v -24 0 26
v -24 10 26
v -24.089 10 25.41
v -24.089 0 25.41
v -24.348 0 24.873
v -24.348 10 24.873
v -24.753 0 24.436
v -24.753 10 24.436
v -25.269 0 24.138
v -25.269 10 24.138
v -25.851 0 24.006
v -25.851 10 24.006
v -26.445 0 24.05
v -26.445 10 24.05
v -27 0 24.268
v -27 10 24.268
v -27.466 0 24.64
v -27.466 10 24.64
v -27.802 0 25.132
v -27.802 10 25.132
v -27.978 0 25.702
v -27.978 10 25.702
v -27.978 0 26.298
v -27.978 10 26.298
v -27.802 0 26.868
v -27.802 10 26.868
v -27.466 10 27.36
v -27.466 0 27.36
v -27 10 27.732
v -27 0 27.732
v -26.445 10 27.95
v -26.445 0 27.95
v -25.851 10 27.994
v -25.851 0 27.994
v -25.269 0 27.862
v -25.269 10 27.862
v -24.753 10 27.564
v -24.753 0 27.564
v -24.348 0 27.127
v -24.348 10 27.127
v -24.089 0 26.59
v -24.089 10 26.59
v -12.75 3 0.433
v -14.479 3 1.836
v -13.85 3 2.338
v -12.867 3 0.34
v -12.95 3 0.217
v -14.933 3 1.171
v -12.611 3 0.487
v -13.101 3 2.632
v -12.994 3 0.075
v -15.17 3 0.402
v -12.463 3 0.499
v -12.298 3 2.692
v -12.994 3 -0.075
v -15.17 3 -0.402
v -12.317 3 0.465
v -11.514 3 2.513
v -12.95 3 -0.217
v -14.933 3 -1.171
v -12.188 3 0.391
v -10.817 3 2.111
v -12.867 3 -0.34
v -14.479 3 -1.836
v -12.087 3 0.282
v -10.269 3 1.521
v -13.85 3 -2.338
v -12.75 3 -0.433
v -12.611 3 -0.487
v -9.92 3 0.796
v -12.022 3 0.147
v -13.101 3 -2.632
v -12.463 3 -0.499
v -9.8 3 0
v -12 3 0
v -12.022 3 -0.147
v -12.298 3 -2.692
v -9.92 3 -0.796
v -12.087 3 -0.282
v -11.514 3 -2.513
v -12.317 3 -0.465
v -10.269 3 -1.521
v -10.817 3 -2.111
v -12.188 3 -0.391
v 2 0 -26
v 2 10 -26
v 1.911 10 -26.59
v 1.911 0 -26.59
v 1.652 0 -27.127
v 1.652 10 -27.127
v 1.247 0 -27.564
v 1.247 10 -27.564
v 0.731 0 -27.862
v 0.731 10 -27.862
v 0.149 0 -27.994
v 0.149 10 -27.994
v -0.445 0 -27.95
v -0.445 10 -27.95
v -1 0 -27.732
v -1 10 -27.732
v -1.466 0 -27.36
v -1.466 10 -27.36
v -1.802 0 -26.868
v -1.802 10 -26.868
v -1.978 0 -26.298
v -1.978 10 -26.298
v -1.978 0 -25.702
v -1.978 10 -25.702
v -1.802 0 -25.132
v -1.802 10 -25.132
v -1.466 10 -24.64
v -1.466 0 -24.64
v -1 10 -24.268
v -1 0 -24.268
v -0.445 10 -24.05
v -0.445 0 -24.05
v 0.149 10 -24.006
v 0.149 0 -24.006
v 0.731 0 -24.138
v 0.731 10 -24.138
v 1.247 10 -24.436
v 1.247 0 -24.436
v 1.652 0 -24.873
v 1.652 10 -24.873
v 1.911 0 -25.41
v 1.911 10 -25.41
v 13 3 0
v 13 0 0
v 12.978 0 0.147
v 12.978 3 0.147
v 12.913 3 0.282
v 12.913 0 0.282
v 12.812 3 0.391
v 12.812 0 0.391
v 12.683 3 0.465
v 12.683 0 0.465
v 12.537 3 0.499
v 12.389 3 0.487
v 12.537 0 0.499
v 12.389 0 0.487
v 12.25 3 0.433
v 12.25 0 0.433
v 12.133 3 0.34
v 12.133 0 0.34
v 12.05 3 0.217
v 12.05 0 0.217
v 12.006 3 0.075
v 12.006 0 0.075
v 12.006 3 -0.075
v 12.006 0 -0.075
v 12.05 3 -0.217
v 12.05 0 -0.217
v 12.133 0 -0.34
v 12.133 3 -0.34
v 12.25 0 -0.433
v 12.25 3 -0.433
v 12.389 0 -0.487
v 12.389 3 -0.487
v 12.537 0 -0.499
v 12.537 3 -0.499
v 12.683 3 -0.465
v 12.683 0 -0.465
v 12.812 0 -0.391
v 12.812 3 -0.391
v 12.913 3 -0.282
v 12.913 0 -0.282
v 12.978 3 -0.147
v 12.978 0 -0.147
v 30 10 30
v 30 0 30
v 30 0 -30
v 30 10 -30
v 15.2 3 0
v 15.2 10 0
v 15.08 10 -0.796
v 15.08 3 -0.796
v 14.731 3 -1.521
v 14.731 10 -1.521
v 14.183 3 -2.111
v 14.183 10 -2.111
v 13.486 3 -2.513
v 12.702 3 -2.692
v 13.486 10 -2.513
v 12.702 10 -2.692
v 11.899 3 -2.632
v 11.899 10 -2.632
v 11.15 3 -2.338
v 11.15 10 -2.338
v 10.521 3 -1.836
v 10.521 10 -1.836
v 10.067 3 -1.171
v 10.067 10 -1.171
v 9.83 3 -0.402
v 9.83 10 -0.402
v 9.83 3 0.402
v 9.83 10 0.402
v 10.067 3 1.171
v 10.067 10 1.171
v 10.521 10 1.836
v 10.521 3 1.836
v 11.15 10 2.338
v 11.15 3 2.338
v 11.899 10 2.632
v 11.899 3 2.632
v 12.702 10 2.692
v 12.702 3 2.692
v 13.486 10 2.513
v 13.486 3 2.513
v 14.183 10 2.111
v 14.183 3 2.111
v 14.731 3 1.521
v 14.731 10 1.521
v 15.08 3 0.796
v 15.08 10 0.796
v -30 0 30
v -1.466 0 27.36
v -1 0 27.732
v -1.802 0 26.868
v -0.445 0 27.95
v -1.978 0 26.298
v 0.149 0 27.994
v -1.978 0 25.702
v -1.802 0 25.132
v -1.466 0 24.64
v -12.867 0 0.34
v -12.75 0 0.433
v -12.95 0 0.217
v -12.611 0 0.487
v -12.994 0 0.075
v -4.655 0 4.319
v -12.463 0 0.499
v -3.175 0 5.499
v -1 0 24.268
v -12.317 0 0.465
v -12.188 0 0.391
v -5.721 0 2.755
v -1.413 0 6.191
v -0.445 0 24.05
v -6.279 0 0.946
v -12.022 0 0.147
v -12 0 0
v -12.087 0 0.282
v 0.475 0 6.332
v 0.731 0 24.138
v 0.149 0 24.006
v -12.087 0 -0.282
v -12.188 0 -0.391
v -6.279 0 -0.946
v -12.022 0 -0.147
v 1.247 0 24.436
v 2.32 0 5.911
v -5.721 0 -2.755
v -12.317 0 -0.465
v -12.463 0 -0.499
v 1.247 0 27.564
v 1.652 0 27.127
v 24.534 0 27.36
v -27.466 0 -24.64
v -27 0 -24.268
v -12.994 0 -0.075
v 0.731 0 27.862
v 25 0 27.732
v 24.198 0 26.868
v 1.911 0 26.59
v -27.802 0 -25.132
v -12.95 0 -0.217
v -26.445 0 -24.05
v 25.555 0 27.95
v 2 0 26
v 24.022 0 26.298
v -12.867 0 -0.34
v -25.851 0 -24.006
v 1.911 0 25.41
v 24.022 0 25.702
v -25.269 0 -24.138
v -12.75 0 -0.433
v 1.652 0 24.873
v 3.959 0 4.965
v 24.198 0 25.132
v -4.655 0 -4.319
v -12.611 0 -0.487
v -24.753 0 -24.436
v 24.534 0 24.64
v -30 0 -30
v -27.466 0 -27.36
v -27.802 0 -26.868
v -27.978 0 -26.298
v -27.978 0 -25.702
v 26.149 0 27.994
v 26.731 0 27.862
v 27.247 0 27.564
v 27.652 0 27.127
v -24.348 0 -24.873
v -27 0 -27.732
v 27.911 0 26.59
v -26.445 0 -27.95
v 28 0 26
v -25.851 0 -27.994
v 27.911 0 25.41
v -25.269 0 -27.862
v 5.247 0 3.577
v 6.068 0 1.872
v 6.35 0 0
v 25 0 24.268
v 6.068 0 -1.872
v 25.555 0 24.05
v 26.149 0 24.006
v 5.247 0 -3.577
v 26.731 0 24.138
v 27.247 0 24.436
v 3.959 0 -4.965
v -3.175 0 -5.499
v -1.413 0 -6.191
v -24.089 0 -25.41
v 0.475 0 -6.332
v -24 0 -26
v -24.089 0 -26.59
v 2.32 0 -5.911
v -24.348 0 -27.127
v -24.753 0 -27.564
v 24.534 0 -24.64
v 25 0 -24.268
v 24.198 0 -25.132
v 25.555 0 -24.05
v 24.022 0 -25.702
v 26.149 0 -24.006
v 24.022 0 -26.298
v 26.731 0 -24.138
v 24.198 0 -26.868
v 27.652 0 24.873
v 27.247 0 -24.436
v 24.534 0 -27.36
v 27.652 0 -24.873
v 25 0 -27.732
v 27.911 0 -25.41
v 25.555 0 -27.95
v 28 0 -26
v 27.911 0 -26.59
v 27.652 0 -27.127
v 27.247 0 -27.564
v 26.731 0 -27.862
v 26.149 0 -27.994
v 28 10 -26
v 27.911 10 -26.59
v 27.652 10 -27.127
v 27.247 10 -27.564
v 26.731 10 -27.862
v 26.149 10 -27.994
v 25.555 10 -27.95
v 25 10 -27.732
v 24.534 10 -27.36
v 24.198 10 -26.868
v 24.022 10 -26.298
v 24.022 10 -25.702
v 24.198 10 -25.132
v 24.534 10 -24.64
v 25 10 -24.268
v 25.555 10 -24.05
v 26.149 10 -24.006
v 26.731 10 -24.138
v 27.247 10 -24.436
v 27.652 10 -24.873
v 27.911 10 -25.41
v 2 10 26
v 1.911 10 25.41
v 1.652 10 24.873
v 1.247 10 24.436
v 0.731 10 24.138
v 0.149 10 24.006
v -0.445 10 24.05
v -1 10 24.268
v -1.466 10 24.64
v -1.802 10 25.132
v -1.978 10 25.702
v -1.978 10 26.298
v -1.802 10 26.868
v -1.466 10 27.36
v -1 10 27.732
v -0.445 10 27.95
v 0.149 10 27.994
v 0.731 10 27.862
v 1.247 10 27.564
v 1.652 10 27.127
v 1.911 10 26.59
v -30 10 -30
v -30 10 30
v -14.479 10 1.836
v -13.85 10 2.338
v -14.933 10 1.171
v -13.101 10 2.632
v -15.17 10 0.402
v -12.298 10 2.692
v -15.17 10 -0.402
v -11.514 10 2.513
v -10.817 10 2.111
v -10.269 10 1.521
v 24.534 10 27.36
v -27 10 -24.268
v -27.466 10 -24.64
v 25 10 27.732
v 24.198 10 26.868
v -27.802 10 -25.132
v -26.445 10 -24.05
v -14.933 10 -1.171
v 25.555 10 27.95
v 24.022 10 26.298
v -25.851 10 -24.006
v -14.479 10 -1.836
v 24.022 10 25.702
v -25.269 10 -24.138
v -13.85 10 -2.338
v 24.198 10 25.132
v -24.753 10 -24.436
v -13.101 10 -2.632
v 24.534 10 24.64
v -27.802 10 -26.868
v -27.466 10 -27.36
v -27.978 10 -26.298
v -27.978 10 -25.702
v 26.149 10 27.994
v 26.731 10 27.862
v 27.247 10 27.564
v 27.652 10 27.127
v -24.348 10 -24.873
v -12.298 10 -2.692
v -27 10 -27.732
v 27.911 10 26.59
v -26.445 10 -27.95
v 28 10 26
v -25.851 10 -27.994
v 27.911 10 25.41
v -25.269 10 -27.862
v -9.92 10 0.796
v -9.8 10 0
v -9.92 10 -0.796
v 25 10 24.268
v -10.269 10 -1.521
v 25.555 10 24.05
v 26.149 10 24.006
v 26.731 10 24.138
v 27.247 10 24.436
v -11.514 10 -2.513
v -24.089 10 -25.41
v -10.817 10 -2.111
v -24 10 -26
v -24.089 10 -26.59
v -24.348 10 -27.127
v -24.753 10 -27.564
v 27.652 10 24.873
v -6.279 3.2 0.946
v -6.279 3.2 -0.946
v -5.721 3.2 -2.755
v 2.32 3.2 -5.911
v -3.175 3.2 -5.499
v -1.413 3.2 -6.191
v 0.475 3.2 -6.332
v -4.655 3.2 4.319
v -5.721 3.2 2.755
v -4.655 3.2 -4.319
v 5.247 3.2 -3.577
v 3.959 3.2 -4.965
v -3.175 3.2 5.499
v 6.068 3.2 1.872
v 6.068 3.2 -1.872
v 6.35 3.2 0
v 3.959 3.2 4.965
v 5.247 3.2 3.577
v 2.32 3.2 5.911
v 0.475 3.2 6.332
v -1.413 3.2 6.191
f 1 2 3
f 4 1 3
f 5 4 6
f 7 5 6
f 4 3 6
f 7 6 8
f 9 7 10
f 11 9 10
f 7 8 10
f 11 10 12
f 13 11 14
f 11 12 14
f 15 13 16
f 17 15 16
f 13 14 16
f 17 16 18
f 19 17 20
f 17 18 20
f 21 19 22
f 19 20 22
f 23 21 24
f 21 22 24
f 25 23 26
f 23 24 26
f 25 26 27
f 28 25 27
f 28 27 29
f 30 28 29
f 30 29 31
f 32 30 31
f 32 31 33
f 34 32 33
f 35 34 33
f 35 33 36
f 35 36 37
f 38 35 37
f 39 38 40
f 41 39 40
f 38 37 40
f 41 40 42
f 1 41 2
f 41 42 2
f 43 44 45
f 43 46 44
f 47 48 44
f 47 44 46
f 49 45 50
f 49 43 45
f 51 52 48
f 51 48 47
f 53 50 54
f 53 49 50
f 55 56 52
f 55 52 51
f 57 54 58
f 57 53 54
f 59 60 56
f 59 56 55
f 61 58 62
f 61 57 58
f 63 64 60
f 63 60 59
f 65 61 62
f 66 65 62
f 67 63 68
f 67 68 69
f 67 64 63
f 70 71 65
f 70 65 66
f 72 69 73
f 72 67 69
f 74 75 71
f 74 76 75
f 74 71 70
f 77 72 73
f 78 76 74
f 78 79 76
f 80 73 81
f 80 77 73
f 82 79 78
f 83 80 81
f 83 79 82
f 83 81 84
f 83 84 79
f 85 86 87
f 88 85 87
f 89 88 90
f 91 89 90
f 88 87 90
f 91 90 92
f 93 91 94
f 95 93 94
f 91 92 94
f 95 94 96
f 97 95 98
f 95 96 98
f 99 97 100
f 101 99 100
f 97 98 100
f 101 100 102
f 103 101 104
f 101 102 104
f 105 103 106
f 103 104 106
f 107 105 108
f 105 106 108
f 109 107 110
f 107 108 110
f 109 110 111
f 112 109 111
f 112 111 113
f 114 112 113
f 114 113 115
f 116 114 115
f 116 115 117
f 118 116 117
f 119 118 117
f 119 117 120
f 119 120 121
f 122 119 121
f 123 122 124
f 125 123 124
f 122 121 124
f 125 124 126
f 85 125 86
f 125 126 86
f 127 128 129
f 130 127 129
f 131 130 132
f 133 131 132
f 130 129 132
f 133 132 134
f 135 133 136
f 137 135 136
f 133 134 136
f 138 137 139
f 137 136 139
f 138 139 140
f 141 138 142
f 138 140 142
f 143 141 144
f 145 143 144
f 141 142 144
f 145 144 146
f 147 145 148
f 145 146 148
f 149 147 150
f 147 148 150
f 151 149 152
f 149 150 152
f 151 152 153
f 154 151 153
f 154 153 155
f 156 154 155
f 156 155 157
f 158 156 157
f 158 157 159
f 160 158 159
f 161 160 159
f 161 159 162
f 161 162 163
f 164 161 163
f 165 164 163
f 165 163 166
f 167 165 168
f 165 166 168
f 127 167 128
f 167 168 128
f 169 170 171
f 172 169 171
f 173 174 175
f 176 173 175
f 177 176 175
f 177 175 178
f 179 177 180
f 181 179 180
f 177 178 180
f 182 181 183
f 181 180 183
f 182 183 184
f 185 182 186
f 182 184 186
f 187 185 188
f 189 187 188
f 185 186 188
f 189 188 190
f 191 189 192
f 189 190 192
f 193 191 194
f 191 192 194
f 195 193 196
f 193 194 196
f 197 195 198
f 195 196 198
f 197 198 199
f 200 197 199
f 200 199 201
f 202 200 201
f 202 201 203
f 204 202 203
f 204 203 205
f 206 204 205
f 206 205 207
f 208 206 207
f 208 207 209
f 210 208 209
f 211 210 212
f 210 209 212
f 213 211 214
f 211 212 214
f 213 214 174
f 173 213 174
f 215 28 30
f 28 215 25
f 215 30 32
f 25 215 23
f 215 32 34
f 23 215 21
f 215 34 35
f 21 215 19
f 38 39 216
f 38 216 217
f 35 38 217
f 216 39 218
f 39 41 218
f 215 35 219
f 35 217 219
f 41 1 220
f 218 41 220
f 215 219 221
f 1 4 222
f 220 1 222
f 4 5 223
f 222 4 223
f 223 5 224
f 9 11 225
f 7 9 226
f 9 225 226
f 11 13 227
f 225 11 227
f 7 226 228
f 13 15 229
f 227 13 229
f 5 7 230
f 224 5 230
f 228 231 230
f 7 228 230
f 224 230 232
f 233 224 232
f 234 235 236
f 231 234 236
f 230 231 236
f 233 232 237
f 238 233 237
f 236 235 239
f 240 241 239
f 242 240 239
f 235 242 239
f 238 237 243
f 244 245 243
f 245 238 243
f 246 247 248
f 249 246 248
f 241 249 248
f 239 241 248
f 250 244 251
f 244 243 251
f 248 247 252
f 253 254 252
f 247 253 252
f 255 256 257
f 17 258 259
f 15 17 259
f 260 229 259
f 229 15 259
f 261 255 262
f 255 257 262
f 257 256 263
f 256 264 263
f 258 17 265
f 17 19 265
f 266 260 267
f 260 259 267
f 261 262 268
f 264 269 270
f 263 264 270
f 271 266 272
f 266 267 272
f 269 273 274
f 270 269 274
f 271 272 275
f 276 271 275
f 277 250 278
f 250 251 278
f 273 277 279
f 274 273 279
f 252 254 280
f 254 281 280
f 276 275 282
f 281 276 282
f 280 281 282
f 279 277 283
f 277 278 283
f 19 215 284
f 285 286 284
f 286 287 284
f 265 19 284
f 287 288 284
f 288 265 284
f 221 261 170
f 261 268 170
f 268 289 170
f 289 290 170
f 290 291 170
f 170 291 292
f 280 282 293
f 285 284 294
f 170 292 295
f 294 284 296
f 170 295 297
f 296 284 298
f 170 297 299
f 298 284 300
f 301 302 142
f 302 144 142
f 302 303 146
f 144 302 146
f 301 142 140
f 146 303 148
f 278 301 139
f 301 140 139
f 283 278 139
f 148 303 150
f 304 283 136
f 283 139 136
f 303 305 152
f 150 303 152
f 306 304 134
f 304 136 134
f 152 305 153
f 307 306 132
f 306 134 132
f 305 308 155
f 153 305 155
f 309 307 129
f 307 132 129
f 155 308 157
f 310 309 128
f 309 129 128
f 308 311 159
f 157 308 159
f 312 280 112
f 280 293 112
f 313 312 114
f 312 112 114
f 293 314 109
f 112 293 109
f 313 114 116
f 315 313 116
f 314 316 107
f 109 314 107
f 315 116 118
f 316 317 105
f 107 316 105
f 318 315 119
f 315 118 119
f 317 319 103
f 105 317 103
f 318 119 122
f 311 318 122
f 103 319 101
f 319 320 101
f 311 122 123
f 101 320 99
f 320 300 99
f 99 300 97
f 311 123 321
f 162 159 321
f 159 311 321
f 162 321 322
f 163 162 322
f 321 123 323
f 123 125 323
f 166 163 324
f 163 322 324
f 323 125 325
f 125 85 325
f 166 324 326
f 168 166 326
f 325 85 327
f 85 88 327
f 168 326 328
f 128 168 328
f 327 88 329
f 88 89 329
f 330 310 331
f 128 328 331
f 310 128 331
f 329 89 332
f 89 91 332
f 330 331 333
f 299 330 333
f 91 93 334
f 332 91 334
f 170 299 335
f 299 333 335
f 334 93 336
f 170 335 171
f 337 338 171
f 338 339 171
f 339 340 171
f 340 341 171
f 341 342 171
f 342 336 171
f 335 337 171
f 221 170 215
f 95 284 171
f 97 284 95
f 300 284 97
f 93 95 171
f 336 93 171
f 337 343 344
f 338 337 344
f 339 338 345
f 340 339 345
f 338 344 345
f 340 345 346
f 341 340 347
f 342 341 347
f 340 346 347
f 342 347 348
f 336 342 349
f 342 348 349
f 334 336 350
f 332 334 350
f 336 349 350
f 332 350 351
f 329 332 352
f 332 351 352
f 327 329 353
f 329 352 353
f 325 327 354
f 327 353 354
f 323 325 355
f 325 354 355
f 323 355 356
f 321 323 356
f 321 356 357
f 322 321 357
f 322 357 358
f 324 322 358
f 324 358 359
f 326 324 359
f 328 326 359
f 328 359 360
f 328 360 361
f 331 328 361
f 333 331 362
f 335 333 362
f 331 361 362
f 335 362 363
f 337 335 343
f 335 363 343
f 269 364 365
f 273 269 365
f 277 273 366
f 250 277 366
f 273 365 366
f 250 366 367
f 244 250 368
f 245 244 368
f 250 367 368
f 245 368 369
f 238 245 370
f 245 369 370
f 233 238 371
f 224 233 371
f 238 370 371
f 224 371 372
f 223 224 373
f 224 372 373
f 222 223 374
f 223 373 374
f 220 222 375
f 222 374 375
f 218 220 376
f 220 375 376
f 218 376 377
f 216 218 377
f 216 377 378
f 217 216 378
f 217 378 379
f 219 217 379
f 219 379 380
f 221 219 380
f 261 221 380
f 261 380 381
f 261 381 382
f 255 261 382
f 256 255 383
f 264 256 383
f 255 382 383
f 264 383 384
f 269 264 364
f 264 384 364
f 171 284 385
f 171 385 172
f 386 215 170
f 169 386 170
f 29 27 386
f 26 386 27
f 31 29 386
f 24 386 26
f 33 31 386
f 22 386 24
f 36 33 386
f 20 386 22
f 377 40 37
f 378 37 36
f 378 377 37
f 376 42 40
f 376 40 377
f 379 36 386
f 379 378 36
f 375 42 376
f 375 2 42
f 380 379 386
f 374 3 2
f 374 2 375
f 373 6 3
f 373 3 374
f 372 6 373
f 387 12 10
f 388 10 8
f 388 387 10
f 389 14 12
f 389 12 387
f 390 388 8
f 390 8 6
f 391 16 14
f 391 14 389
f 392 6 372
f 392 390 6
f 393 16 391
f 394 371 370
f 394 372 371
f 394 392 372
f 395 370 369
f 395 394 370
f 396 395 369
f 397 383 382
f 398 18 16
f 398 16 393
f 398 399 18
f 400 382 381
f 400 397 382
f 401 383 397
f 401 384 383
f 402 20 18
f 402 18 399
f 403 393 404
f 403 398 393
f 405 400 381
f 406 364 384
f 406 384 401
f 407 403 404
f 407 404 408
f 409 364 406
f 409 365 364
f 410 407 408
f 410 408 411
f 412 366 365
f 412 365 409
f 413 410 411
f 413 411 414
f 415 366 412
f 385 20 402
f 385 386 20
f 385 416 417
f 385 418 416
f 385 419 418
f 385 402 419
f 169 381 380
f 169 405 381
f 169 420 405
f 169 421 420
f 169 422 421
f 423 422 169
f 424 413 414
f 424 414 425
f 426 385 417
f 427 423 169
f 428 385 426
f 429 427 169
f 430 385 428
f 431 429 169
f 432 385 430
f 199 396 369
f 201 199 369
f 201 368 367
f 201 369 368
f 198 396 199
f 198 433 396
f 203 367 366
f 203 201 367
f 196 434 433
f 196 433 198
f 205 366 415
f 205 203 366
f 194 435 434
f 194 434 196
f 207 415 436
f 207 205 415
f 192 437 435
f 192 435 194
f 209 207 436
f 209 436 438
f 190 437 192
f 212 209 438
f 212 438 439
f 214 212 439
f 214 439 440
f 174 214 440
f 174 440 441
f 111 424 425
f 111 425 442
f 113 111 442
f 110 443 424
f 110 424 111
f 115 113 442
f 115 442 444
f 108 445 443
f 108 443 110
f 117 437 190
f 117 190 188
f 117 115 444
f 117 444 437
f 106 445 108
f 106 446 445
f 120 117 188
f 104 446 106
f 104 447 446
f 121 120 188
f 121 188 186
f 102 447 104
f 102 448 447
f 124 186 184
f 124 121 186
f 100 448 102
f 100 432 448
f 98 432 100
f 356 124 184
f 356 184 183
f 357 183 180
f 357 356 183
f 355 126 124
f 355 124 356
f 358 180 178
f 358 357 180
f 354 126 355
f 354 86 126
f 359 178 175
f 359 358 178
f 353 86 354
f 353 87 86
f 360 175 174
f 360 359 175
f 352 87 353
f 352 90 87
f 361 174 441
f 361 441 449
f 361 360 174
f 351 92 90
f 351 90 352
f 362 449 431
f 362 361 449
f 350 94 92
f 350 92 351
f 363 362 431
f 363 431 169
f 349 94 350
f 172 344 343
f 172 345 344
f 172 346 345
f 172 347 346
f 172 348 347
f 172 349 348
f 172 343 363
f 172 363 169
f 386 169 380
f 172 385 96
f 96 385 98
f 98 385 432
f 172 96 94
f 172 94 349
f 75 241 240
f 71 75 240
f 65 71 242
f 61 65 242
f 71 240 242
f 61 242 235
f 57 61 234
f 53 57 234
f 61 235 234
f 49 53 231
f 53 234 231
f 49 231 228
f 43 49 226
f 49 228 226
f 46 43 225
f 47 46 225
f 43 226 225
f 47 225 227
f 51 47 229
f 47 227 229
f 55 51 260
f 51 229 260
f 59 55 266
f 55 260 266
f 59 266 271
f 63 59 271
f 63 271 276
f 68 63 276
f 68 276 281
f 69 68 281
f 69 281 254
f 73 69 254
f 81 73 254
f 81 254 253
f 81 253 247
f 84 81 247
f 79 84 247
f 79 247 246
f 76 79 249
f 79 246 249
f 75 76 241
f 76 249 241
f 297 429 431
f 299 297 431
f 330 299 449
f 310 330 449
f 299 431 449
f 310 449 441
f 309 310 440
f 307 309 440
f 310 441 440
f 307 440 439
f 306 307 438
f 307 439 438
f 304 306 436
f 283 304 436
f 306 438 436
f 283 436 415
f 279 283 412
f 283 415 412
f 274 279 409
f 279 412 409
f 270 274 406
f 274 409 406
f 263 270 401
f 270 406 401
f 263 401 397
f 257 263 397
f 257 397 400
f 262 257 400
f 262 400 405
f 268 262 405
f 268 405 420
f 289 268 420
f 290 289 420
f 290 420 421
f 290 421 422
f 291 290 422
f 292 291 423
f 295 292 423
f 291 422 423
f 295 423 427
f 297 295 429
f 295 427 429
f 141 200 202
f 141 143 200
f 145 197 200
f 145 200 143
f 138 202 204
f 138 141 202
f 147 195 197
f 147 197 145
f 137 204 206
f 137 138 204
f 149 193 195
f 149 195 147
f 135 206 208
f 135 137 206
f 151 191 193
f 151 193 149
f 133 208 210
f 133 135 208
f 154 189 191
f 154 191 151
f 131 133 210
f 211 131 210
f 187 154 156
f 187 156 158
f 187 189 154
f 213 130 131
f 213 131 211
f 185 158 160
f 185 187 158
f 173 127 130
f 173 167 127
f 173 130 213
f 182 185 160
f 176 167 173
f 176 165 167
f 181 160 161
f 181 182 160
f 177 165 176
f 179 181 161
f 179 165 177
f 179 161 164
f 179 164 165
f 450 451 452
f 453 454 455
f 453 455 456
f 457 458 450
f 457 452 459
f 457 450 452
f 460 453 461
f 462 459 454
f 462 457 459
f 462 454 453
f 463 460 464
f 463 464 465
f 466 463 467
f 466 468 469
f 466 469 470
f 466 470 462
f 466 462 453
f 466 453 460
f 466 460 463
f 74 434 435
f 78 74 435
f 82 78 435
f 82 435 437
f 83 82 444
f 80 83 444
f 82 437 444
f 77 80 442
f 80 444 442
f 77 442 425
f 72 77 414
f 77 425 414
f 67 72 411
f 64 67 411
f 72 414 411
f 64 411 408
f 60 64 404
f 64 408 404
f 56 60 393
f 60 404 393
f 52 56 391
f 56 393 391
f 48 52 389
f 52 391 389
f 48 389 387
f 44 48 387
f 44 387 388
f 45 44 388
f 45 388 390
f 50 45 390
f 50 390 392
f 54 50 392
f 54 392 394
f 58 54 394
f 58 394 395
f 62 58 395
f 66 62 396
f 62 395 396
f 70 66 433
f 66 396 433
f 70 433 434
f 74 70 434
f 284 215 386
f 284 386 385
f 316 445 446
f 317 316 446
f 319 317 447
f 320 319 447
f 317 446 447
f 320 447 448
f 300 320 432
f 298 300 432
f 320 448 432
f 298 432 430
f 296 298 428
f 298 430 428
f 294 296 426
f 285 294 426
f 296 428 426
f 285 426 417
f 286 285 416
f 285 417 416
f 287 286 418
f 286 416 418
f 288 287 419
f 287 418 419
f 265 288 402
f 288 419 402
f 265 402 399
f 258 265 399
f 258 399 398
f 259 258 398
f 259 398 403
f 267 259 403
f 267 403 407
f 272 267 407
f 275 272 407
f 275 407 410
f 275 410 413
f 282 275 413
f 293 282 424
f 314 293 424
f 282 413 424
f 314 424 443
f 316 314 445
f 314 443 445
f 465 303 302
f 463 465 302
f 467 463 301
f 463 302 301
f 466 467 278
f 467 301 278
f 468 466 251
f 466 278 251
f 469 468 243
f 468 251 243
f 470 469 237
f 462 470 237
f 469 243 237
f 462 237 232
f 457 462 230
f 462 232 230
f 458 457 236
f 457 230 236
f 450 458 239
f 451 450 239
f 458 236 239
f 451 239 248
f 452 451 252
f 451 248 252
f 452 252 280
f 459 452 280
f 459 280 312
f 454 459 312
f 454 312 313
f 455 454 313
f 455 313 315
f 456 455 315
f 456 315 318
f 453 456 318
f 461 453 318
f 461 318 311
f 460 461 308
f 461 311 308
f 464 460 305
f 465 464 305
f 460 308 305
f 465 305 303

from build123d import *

# Parameters (mm, degrees)
SKETCH2_W           = 60
SKETCH2_H           = 60
BOSS_EXTRUDE1_DEPTH = 10
SKETCH3_R           = 2
CUT_EXTRUDE1_DEPTH  = 10
SKETCH4_R           = 6.35
CUT_EXTRUDE2_DEPTH  = 3.2
SKETCH5_R           = 2.7
CUT_EXTRUDE3_DEPTH  = 7
SKETCH6_R           = 0.5
CUT_EXTRUDE4_DEPTH  = 3


with BuildPart() as part:
    # Sketch2 → Boss-Extrude1 (new body)
    with BuildSketch(Plane(origin=(0, 0, 0), x_dir=(1, 0, 0), z_dir=(0, 1, 0))):
        Rectangle(SKETCH2_W, SKETCH2_H)
    extrude(amount=BOSS_EXTRUDE1_DEPTH)

    # Sketch3 → Cut-Extrude1 (cut)
    with BuildSketch(Plane(origin=(0, 10, 0), x_dir=(1, 0, 0), z_dir=(0, 1, 0))):
        with Locations((-26, 26)):
            Circle(SKETCH3_R)
        with Locations((-26, -26)):
            Circle(SKETCH3_R)
        with Locations((0, -26)):
            Circle(SKETCH3_R)
        with Locations((26, -26)):
            Circle(SKETCH3_R)
        with Locations((26, 26)):
            Circle(SKETCH3_R)
        with Locations((0, 26)):
            Circle(SKETCH3_R)
    extrude(amount=-CUT_EXTRUDE1_DEPTH, mode=Mode.SUBTRACT)

    # Sketch4 → Cut-Extrude2 (cut)
    with BuildSketch(Plane.XZ):
        Circle(SKETCH4_R)
    extrude(amount=-CUT_EXTRUDE2_DEPTH, mode=Mode.SUBTRACT)

    # Sketch5 → Cut-Extrude3 (cut)
    with BuildSketch(Plane(origin=(0, 10, 0), x_dir=(1, 0, 0), z_dir=(0, 1, 0))):
        with Locations((12.5, 0)):
            Circle(SKETCH5_R)
        with Locations((-12.5, 0)):
            Circle(SKETCH5_R)
    extrude(amount=-CUT_EXTRUDE3_DEPTH, mode=Mode.SUBTRACT)

    # Sketch6 → Cut-Extrude4 (cut)
    with BuildSketch(Plane.XZ):
        with Locations((12.5, 0)):
            Circle(SKETCH6_R)
        with Locations((-12.5, 0)):
            Circle(SKETCH6_R)
    extrude(amount=-CUT_EXTRUDE4_DEPTH, mode=Mode.SUBTRACT)


solid = part.part
